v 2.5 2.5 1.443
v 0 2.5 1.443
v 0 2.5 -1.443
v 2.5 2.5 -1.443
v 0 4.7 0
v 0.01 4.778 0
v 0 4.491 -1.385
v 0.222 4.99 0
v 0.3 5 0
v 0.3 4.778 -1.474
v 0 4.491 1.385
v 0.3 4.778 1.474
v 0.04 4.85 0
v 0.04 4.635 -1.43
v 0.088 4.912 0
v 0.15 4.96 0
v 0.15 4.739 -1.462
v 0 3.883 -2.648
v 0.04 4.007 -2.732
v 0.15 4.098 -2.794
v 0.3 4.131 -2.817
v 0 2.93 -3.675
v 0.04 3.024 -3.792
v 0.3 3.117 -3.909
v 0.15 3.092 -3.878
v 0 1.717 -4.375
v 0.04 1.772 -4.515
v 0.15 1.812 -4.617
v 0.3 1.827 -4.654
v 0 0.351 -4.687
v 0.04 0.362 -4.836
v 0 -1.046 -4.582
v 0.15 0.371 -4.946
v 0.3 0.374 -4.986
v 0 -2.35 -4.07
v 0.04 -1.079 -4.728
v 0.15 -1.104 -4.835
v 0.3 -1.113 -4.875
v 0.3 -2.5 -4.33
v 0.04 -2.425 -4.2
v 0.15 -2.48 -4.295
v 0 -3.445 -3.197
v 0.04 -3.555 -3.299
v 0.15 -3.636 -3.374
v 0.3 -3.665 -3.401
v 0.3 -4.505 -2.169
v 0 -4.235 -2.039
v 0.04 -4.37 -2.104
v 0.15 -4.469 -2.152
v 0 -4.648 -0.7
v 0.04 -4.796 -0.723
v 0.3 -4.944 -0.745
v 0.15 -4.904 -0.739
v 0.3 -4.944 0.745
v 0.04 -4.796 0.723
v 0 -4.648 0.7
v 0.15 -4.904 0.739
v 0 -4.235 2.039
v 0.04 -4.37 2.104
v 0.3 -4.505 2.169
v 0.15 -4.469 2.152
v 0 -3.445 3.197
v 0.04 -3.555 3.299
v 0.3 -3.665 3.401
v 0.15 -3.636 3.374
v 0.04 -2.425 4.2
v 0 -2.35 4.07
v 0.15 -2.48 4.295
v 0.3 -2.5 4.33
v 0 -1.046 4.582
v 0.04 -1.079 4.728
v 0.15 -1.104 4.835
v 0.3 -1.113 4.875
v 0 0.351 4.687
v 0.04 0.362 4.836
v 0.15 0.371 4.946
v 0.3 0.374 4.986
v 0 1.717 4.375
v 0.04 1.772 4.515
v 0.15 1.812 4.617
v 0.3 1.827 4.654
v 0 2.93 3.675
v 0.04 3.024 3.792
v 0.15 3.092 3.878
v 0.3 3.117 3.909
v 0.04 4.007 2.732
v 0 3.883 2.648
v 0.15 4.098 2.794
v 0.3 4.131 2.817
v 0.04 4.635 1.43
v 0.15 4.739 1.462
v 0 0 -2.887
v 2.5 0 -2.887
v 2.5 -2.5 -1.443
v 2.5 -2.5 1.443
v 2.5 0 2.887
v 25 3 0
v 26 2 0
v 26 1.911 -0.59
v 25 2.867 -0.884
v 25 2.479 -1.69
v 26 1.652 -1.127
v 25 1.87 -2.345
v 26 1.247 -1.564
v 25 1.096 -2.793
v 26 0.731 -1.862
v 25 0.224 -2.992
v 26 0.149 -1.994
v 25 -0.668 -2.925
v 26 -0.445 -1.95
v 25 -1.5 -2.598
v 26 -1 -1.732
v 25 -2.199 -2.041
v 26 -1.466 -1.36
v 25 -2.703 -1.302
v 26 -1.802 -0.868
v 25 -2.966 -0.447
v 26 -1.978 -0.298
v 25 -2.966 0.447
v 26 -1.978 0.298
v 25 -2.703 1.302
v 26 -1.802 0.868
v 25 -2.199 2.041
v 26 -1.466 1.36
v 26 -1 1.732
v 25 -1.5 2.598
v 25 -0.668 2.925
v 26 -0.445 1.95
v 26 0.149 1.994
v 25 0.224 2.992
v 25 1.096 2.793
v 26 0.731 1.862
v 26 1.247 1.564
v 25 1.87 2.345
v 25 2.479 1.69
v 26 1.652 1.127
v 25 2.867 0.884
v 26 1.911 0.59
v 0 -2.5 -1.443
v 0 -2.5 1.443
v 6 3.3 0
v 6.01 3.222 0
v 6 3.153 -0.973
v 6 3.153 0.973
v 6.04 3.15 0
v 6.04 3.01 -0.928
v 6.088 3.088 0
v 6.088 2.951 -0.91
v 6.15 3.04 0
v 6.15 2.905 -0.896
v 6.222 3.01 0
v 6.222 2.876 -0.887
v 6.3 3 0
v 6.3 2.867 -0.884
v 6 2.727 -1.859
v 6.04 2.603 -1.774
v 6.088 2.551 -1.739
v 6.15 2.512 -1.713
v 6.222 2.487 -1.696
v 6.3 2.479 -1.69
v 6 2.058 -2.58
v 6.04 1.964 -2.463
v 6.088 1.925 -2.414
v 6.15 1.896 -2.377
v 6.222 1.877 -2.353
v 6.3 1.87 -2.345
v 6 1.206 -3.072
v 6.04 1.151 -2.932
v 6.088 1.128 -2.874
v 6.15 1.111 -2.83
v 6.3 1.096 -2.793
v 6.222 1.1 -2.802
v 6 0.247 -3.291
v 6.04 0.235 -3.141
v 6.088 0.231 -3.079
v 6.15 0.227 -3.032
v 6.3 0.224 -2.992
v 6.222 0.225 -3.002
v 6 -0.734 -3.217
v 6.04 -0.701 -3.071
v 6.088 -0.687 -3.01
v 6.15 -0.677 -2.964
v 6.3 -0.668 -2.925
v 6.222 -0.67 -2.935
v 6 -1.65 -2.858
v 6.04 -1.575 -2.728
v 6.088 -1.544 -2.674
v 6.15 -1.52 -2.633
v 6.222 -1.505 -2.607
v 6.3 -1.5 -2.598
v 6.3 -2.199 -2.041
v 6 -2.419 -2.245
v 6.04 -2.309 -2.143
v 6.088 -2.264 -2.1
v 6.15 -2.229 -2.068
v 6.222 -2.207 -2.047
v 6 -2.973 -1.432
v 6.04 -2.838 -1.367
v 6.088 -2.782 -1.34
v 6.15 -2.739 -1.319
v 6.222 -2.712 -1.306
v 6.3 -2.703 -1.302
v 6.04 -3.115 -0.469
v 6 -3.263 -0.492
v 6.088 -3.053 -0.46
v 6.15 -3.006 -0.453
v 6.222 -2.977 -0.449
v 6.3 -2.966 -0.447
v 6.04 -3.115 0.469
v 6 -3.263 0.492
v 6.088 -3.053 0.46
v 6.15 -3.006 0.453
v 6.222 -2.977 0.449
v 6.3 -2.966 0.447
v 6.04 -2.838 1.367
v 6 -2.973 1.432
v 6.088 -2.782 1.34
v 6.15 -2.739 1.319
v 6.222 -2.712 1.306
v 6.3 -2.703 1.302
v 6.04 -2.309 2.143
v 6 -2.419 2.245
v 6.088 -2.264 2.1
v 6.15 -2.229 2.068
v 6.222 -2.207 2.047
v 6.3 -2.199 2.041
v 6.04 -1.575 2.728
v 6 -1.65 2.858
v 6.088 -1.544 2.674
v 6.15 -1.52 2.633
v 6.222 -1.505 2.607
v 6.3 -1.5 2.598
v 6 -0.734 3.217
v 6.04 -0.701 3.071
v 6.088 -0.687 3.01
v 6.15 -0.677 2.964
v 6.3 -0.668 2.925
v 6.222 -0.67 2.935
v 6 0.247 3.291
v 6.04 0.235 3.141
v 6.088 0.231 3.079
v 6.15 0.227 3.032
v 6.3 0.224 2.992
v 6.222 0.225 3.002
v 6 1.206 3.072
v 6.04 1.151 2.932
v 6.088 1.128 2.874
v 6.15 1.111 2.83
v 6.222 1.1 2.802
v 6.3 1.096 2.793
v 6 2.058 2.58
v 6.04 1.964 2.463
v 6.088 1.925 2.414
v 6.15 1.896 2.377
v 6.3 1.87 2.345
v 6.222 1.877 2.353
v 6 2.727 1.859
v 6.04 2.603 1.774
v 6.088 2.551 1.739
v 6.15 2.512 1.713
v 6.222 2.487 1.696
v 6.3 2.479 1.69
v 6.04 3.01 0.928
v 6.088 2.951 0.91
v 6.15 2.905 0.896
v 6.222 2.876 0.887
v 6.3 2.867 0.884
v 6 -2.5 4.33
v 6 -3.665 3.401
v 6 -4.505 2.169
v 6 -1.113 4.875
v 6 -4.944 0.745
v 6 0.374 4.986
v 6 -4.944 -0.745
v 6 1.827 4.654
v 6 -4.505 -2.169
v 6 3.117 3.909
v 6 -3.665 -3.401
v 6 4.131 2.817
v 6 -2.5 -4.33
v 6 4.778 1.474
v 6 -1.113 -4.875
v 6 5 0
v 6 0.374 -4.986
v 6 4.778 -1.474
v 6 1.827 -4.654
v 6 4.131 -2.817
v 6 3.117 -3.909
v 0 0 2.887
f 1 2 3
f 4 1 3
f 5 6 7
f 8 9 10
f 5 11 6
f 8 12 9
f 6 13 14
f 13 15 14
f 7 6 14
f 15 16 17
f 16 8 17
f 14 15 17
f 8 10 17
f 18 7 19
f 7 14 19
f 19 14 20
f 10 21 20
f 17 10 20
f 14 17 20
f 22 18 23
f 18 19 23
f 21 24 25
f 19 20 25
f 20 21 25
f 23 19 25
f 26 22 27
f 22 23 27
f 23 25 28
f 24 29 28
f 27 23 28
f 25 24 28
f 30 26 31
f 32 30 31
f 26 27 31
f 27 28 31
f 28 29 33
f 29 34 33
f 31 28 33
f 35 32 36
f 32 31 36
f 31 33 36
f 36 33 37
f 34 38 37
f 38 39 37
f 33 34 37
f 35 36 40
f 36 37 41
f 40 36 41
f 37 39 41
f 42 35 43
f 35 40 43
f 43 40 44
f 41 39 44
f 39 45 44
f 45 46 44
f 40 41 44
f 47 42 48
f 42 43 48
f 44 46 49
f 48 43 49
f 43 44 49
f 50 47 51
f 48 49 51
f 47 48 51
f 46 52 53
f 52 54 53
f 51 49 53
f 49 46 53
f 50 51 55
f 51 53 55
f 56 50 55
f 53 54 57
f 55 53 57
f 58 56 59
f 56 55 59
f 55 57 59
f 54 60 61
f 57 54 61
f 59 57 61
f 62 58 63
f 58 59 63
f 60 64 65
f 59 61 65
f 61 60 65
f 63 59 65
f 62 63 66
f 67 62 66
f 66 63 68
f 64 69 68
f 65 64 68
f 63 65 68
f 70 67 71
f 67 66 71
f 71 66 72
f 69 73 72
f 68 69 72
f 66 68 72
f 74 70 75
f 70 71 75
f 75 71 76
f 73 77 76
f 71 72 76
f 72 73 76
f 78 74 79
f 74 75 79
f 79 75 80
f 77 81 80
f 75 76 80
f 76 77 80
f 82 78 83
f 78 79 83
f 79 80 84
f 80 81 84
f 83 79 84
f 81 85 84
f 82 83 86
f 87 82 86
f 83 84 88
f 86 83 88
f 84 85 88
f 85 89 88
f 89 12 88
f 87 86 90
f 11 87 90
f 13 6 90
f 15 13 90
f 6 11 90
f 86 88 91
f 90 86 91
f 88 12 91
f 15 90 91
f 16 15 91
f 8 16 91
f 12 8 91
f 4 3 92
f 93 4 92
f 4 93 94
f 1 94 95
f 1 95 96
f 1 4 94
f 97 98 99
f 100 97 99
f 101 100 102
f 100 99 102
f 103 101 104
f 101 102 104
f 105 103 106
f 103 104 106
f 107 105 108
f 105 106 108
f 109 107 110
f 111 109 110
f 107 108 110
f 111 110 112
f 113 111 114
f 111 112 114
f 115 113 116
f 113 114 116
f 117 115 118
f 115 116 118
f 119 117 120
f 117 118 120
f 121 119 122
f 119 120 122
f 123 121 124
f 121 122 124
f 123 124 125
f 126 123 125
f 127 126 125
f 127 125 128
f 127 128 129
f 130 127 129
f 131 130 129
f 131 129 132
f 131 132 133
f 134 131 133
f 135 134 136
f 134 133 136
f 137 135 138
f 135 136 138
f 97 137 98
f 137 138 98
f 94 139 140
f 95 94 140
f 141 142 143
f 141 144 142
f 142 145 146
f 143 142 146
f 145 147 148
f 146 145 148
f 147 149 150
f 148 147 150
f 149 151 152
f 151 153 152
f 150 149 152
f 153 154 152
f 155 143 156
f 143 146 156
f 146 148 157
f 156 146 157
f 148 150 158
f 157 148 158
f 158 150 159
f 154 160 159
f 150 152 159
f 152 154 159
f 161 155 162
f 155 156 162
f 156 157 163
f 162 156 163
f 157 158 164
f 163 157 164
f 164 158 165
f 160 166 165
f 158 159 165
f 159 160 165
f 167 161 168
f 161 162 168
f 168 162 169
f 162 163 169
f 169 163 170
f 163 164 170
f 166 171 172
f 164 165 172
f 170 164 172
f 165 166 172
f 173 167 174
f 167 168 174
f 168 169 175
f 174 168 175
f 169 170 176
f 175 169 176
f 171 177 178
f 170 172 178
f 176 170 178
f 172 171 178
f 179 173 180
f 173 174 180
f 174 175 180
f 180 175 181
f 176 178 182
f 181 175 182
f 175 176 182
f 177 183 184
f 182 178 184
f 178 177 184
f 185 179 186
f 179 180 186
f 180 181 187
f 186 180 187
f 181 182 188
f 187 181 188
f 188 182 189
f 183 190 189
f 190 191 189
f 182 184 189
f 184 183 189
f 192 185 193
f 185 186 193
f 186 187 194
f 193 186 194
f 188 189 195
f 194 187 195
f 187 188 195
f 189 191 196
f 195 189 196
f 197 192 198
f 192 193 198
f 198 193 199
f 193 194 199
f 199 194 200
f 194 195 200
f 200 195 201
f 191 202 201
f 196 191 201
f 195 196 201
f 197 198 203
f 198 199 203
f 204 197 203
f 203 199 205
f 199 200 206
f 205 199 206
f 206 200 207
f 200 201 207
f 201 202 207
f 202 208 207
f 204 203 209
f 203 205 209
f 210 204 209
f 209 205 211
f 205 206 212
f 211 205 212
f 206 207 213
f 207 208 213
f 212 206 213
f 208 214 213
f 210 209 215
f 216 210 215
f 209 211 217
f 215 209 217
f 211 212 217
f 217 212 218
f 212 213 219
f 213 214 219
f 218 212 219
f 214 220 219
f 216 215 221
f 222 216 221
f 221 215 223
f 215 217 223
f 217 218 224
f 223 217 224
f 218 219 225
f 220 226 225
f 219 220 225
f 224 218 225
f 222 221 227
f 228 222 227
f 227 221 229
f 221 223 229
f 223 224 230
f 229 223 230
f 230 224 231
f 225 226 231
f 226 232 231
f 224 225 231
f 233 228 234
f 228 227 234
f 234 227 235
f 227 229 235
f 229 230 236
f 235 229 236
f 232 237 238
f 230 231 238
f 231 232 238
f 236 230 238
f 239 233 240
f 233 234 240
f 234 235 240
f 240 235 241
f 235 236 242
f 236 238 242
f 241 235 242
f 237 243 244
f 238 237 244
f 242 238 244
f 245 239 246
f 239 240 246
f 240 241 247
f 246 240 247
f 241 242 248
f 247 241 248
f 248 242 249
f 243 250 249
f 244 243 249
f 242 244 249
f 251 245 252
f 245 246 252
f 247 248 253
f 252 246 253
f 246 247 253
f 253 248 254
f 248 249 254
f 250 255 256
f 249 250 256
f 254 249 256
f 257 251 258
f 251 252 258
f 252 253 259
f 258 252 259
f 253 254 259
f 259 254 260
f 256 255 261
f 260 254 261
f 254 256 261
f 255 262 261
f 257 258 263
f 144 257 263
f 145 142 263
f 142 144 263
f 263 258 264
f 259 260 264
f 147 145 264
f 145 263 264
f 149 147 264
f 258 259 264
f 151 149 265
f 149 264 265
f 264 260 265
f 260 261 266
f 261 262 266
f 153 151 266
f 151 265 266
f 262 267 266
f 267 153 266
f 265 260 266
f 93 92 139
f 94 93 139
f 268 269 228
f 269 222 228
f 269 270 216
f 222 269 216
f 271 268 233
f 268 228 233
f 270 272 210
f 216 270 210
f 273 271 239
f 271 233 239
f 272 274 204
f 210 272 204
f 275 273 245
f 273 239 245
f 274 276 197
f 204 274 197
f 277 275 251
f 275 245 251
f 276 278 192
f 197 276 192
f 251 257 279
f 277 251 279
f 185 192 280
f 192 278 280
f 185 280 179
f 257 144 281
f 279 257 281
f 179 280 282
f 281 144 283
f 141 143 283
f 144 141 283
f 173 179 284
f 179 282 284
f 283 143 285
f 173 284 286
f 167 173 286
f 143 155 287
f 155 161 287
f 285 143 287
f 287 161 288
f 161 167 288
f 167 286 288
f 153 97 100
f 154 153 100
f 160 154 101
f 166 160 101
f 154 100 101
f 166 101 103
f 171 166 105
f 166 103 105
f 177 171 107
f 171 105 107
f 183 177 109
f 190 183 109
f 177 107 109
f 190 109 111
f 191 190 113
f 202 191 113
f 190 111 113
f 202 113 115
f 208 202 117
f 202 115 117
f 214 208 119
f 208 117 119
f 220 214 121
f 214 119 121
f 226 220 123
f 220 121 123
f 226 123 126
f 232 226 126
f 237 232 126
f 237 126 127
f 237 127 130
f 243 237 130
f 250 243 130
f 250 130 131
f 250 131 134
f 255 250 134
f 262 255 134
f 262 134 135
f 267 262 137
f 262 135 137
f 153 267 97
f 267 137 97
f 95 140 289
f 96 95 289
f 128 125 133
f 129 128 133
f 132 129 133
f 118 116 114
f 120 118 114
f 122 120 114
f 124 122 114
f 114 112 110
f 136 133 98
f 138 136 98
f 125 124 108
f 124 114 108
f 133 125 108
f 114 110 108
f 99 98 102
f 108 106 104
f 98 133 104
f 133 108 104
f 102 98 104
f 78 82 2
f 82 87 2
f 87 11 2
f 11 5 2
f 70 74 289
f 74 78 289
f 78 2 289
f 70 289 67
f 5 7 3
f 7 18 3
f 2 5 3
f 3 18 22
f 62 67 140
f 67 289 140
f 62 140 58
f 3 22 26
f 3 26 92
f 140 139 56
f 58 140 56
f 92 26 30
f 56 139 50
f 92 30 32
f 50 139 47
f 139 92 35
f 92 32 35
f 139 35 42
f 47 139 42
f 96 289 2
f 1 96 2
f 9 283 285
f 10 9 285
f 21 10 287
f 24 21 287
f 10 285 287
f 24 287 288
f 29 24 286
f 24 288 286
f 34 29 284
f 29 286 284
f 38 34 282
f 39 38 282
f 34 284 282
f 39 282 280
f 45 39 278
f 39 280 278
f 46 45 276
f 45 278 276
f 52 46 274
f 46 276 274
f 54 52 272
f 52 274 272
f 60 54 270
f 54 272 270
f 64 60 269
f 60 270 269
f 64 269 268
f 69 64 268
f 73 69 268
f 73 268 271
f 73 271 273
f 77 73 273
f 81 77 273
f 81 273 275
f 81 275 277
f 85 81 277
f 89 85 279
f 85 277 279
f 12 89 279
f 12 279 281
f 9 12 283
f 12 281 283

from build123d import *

# Parameters (mm, degrees)
CUT_EXTRUDE_1_DEPTH = 2.5
FILLET_1_R          = 0.3
CHAMFER_1_SIZE      = 1


with BuildPart() as part:
    # Эскиз1 → Повернуть1 (revolve)
    with BuildSketch(Plane.XY):
        Polygon((0, 0), (0, 5), (6, 5), (6, 3), (26, 3), (26, 0), align=None)
    revolve(axis=Axis((26, 0, 0), (-1, 0, 0)))

    # Эскиз2 → Вырез-Вытянуть1 (cut)
    with BuildSketch(Plane.ZY):
        Polygon((-1.443375673, 2.5), (-2.886751346, 0), (-1.443375673, -2.5), (1.443375673, -2.5), (2.886751346, 0), (1.443375673, 2.5), align=None)
    extrude(amount=-CUT_EXTRUDE_1_DEPTH, mode=Mode.SUBTRACT)

    # Скругление1
    fillet_1_edges = [part.edges().sort_by_distance(p)[0] for p in [
        (6, -3, 0),
        (0, -5, 0),
    ]]
    fillet(fillet_1_edges, radius=FILLET_1_R)

    # Фаска1
    chamfer_1_edges = [part.edges().sort_by_distance(p)[0] for p in [
        (26, -3, 0),
    ]]
    chamfer(chamfer_1_edges, length=CHAMFER_1_SIZE)


solid = part.part
